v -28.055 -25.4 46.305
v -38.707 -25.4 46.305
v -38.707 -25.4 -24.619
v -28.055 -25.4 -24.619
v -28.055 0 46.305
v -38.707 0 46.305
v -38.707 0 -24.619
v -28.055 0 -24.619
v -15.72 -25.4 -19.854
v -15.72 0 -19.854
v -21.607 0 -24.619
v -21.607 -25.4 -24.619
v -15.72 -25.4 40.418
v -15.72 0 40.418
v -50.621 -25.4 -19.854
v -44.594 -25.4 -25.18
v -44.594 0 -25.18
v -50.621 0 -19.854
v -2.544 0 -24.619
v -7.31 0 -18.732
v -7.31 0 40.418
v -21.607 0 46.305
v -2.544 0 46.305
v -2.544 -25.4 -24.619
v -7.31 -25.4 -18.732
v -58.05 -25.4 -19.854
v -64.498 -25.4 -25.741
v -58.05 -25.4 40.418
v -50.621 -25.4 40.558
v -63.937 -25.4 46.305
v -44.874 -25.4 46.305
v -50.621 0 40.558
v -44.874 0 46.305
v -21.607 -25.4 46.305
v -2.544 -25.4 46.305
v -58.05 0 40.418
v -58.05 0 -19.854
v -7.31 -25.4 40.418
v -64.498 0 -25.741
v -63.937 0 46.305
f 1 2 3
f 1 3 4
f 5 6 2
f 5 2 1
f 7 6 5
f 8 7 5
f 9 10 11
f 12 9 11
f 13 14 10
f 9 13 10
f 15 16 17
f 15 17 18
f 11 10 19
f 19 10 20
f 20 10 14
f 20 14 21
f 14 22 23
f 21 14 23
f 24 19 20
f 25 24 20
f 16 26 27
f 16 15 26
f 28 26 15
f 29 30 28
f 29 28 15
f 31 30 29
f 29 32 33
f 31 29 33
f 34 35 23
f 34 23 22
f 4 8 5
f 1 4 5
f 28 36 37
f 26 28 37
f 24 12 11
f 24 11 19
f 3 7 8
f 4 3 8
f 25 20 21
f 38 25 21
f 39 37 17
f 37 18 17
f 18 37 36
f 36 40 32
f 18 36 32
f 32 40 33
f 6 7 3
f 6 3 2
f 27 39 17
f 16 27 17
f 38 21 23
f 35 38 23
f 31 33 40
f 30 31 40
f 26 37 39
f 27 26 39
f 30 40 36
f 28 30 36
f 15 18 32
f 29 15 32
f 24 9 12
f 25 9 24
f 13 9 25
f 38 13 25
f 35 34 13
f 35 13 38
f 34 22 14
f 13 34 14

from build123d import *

# Parameters (mm, degrees)
F0_W     = 10.652607
F0_H     = 70.923931
F1_DEPTH = 25.4


with BuildPart() as f1:
    # F0 (on Front) → F1 (new body)
    with BuildSketch(Plane.XZ):
        Polygon((-44.874448, 46.304666), (-63.937008, 46.304666), (-58.05004, 40.417701), (-58.05004, -19.853624), (-64.497672, -25.74059), (-44.594117, -25.179928), (-50.621245, -19.853624), (-50.621245, 40.557865), align=None)
        with Locations((-33.380848, 10.8427)):
            Rectangle(F0_W, F0_H)
        Polygon((-2.544356, 46.304666), (-21.606913, 46.304666), (-15.719946, 40.417701), (-15.719946, -19.853624), (-21.606913, -24.619265), (-2.544356, -24.619265), (-7.309995, -18.732296), (-7.309995, 40.417701), align=None)
    extrude(amount=F1_DEPTH)


solid = f1.part
